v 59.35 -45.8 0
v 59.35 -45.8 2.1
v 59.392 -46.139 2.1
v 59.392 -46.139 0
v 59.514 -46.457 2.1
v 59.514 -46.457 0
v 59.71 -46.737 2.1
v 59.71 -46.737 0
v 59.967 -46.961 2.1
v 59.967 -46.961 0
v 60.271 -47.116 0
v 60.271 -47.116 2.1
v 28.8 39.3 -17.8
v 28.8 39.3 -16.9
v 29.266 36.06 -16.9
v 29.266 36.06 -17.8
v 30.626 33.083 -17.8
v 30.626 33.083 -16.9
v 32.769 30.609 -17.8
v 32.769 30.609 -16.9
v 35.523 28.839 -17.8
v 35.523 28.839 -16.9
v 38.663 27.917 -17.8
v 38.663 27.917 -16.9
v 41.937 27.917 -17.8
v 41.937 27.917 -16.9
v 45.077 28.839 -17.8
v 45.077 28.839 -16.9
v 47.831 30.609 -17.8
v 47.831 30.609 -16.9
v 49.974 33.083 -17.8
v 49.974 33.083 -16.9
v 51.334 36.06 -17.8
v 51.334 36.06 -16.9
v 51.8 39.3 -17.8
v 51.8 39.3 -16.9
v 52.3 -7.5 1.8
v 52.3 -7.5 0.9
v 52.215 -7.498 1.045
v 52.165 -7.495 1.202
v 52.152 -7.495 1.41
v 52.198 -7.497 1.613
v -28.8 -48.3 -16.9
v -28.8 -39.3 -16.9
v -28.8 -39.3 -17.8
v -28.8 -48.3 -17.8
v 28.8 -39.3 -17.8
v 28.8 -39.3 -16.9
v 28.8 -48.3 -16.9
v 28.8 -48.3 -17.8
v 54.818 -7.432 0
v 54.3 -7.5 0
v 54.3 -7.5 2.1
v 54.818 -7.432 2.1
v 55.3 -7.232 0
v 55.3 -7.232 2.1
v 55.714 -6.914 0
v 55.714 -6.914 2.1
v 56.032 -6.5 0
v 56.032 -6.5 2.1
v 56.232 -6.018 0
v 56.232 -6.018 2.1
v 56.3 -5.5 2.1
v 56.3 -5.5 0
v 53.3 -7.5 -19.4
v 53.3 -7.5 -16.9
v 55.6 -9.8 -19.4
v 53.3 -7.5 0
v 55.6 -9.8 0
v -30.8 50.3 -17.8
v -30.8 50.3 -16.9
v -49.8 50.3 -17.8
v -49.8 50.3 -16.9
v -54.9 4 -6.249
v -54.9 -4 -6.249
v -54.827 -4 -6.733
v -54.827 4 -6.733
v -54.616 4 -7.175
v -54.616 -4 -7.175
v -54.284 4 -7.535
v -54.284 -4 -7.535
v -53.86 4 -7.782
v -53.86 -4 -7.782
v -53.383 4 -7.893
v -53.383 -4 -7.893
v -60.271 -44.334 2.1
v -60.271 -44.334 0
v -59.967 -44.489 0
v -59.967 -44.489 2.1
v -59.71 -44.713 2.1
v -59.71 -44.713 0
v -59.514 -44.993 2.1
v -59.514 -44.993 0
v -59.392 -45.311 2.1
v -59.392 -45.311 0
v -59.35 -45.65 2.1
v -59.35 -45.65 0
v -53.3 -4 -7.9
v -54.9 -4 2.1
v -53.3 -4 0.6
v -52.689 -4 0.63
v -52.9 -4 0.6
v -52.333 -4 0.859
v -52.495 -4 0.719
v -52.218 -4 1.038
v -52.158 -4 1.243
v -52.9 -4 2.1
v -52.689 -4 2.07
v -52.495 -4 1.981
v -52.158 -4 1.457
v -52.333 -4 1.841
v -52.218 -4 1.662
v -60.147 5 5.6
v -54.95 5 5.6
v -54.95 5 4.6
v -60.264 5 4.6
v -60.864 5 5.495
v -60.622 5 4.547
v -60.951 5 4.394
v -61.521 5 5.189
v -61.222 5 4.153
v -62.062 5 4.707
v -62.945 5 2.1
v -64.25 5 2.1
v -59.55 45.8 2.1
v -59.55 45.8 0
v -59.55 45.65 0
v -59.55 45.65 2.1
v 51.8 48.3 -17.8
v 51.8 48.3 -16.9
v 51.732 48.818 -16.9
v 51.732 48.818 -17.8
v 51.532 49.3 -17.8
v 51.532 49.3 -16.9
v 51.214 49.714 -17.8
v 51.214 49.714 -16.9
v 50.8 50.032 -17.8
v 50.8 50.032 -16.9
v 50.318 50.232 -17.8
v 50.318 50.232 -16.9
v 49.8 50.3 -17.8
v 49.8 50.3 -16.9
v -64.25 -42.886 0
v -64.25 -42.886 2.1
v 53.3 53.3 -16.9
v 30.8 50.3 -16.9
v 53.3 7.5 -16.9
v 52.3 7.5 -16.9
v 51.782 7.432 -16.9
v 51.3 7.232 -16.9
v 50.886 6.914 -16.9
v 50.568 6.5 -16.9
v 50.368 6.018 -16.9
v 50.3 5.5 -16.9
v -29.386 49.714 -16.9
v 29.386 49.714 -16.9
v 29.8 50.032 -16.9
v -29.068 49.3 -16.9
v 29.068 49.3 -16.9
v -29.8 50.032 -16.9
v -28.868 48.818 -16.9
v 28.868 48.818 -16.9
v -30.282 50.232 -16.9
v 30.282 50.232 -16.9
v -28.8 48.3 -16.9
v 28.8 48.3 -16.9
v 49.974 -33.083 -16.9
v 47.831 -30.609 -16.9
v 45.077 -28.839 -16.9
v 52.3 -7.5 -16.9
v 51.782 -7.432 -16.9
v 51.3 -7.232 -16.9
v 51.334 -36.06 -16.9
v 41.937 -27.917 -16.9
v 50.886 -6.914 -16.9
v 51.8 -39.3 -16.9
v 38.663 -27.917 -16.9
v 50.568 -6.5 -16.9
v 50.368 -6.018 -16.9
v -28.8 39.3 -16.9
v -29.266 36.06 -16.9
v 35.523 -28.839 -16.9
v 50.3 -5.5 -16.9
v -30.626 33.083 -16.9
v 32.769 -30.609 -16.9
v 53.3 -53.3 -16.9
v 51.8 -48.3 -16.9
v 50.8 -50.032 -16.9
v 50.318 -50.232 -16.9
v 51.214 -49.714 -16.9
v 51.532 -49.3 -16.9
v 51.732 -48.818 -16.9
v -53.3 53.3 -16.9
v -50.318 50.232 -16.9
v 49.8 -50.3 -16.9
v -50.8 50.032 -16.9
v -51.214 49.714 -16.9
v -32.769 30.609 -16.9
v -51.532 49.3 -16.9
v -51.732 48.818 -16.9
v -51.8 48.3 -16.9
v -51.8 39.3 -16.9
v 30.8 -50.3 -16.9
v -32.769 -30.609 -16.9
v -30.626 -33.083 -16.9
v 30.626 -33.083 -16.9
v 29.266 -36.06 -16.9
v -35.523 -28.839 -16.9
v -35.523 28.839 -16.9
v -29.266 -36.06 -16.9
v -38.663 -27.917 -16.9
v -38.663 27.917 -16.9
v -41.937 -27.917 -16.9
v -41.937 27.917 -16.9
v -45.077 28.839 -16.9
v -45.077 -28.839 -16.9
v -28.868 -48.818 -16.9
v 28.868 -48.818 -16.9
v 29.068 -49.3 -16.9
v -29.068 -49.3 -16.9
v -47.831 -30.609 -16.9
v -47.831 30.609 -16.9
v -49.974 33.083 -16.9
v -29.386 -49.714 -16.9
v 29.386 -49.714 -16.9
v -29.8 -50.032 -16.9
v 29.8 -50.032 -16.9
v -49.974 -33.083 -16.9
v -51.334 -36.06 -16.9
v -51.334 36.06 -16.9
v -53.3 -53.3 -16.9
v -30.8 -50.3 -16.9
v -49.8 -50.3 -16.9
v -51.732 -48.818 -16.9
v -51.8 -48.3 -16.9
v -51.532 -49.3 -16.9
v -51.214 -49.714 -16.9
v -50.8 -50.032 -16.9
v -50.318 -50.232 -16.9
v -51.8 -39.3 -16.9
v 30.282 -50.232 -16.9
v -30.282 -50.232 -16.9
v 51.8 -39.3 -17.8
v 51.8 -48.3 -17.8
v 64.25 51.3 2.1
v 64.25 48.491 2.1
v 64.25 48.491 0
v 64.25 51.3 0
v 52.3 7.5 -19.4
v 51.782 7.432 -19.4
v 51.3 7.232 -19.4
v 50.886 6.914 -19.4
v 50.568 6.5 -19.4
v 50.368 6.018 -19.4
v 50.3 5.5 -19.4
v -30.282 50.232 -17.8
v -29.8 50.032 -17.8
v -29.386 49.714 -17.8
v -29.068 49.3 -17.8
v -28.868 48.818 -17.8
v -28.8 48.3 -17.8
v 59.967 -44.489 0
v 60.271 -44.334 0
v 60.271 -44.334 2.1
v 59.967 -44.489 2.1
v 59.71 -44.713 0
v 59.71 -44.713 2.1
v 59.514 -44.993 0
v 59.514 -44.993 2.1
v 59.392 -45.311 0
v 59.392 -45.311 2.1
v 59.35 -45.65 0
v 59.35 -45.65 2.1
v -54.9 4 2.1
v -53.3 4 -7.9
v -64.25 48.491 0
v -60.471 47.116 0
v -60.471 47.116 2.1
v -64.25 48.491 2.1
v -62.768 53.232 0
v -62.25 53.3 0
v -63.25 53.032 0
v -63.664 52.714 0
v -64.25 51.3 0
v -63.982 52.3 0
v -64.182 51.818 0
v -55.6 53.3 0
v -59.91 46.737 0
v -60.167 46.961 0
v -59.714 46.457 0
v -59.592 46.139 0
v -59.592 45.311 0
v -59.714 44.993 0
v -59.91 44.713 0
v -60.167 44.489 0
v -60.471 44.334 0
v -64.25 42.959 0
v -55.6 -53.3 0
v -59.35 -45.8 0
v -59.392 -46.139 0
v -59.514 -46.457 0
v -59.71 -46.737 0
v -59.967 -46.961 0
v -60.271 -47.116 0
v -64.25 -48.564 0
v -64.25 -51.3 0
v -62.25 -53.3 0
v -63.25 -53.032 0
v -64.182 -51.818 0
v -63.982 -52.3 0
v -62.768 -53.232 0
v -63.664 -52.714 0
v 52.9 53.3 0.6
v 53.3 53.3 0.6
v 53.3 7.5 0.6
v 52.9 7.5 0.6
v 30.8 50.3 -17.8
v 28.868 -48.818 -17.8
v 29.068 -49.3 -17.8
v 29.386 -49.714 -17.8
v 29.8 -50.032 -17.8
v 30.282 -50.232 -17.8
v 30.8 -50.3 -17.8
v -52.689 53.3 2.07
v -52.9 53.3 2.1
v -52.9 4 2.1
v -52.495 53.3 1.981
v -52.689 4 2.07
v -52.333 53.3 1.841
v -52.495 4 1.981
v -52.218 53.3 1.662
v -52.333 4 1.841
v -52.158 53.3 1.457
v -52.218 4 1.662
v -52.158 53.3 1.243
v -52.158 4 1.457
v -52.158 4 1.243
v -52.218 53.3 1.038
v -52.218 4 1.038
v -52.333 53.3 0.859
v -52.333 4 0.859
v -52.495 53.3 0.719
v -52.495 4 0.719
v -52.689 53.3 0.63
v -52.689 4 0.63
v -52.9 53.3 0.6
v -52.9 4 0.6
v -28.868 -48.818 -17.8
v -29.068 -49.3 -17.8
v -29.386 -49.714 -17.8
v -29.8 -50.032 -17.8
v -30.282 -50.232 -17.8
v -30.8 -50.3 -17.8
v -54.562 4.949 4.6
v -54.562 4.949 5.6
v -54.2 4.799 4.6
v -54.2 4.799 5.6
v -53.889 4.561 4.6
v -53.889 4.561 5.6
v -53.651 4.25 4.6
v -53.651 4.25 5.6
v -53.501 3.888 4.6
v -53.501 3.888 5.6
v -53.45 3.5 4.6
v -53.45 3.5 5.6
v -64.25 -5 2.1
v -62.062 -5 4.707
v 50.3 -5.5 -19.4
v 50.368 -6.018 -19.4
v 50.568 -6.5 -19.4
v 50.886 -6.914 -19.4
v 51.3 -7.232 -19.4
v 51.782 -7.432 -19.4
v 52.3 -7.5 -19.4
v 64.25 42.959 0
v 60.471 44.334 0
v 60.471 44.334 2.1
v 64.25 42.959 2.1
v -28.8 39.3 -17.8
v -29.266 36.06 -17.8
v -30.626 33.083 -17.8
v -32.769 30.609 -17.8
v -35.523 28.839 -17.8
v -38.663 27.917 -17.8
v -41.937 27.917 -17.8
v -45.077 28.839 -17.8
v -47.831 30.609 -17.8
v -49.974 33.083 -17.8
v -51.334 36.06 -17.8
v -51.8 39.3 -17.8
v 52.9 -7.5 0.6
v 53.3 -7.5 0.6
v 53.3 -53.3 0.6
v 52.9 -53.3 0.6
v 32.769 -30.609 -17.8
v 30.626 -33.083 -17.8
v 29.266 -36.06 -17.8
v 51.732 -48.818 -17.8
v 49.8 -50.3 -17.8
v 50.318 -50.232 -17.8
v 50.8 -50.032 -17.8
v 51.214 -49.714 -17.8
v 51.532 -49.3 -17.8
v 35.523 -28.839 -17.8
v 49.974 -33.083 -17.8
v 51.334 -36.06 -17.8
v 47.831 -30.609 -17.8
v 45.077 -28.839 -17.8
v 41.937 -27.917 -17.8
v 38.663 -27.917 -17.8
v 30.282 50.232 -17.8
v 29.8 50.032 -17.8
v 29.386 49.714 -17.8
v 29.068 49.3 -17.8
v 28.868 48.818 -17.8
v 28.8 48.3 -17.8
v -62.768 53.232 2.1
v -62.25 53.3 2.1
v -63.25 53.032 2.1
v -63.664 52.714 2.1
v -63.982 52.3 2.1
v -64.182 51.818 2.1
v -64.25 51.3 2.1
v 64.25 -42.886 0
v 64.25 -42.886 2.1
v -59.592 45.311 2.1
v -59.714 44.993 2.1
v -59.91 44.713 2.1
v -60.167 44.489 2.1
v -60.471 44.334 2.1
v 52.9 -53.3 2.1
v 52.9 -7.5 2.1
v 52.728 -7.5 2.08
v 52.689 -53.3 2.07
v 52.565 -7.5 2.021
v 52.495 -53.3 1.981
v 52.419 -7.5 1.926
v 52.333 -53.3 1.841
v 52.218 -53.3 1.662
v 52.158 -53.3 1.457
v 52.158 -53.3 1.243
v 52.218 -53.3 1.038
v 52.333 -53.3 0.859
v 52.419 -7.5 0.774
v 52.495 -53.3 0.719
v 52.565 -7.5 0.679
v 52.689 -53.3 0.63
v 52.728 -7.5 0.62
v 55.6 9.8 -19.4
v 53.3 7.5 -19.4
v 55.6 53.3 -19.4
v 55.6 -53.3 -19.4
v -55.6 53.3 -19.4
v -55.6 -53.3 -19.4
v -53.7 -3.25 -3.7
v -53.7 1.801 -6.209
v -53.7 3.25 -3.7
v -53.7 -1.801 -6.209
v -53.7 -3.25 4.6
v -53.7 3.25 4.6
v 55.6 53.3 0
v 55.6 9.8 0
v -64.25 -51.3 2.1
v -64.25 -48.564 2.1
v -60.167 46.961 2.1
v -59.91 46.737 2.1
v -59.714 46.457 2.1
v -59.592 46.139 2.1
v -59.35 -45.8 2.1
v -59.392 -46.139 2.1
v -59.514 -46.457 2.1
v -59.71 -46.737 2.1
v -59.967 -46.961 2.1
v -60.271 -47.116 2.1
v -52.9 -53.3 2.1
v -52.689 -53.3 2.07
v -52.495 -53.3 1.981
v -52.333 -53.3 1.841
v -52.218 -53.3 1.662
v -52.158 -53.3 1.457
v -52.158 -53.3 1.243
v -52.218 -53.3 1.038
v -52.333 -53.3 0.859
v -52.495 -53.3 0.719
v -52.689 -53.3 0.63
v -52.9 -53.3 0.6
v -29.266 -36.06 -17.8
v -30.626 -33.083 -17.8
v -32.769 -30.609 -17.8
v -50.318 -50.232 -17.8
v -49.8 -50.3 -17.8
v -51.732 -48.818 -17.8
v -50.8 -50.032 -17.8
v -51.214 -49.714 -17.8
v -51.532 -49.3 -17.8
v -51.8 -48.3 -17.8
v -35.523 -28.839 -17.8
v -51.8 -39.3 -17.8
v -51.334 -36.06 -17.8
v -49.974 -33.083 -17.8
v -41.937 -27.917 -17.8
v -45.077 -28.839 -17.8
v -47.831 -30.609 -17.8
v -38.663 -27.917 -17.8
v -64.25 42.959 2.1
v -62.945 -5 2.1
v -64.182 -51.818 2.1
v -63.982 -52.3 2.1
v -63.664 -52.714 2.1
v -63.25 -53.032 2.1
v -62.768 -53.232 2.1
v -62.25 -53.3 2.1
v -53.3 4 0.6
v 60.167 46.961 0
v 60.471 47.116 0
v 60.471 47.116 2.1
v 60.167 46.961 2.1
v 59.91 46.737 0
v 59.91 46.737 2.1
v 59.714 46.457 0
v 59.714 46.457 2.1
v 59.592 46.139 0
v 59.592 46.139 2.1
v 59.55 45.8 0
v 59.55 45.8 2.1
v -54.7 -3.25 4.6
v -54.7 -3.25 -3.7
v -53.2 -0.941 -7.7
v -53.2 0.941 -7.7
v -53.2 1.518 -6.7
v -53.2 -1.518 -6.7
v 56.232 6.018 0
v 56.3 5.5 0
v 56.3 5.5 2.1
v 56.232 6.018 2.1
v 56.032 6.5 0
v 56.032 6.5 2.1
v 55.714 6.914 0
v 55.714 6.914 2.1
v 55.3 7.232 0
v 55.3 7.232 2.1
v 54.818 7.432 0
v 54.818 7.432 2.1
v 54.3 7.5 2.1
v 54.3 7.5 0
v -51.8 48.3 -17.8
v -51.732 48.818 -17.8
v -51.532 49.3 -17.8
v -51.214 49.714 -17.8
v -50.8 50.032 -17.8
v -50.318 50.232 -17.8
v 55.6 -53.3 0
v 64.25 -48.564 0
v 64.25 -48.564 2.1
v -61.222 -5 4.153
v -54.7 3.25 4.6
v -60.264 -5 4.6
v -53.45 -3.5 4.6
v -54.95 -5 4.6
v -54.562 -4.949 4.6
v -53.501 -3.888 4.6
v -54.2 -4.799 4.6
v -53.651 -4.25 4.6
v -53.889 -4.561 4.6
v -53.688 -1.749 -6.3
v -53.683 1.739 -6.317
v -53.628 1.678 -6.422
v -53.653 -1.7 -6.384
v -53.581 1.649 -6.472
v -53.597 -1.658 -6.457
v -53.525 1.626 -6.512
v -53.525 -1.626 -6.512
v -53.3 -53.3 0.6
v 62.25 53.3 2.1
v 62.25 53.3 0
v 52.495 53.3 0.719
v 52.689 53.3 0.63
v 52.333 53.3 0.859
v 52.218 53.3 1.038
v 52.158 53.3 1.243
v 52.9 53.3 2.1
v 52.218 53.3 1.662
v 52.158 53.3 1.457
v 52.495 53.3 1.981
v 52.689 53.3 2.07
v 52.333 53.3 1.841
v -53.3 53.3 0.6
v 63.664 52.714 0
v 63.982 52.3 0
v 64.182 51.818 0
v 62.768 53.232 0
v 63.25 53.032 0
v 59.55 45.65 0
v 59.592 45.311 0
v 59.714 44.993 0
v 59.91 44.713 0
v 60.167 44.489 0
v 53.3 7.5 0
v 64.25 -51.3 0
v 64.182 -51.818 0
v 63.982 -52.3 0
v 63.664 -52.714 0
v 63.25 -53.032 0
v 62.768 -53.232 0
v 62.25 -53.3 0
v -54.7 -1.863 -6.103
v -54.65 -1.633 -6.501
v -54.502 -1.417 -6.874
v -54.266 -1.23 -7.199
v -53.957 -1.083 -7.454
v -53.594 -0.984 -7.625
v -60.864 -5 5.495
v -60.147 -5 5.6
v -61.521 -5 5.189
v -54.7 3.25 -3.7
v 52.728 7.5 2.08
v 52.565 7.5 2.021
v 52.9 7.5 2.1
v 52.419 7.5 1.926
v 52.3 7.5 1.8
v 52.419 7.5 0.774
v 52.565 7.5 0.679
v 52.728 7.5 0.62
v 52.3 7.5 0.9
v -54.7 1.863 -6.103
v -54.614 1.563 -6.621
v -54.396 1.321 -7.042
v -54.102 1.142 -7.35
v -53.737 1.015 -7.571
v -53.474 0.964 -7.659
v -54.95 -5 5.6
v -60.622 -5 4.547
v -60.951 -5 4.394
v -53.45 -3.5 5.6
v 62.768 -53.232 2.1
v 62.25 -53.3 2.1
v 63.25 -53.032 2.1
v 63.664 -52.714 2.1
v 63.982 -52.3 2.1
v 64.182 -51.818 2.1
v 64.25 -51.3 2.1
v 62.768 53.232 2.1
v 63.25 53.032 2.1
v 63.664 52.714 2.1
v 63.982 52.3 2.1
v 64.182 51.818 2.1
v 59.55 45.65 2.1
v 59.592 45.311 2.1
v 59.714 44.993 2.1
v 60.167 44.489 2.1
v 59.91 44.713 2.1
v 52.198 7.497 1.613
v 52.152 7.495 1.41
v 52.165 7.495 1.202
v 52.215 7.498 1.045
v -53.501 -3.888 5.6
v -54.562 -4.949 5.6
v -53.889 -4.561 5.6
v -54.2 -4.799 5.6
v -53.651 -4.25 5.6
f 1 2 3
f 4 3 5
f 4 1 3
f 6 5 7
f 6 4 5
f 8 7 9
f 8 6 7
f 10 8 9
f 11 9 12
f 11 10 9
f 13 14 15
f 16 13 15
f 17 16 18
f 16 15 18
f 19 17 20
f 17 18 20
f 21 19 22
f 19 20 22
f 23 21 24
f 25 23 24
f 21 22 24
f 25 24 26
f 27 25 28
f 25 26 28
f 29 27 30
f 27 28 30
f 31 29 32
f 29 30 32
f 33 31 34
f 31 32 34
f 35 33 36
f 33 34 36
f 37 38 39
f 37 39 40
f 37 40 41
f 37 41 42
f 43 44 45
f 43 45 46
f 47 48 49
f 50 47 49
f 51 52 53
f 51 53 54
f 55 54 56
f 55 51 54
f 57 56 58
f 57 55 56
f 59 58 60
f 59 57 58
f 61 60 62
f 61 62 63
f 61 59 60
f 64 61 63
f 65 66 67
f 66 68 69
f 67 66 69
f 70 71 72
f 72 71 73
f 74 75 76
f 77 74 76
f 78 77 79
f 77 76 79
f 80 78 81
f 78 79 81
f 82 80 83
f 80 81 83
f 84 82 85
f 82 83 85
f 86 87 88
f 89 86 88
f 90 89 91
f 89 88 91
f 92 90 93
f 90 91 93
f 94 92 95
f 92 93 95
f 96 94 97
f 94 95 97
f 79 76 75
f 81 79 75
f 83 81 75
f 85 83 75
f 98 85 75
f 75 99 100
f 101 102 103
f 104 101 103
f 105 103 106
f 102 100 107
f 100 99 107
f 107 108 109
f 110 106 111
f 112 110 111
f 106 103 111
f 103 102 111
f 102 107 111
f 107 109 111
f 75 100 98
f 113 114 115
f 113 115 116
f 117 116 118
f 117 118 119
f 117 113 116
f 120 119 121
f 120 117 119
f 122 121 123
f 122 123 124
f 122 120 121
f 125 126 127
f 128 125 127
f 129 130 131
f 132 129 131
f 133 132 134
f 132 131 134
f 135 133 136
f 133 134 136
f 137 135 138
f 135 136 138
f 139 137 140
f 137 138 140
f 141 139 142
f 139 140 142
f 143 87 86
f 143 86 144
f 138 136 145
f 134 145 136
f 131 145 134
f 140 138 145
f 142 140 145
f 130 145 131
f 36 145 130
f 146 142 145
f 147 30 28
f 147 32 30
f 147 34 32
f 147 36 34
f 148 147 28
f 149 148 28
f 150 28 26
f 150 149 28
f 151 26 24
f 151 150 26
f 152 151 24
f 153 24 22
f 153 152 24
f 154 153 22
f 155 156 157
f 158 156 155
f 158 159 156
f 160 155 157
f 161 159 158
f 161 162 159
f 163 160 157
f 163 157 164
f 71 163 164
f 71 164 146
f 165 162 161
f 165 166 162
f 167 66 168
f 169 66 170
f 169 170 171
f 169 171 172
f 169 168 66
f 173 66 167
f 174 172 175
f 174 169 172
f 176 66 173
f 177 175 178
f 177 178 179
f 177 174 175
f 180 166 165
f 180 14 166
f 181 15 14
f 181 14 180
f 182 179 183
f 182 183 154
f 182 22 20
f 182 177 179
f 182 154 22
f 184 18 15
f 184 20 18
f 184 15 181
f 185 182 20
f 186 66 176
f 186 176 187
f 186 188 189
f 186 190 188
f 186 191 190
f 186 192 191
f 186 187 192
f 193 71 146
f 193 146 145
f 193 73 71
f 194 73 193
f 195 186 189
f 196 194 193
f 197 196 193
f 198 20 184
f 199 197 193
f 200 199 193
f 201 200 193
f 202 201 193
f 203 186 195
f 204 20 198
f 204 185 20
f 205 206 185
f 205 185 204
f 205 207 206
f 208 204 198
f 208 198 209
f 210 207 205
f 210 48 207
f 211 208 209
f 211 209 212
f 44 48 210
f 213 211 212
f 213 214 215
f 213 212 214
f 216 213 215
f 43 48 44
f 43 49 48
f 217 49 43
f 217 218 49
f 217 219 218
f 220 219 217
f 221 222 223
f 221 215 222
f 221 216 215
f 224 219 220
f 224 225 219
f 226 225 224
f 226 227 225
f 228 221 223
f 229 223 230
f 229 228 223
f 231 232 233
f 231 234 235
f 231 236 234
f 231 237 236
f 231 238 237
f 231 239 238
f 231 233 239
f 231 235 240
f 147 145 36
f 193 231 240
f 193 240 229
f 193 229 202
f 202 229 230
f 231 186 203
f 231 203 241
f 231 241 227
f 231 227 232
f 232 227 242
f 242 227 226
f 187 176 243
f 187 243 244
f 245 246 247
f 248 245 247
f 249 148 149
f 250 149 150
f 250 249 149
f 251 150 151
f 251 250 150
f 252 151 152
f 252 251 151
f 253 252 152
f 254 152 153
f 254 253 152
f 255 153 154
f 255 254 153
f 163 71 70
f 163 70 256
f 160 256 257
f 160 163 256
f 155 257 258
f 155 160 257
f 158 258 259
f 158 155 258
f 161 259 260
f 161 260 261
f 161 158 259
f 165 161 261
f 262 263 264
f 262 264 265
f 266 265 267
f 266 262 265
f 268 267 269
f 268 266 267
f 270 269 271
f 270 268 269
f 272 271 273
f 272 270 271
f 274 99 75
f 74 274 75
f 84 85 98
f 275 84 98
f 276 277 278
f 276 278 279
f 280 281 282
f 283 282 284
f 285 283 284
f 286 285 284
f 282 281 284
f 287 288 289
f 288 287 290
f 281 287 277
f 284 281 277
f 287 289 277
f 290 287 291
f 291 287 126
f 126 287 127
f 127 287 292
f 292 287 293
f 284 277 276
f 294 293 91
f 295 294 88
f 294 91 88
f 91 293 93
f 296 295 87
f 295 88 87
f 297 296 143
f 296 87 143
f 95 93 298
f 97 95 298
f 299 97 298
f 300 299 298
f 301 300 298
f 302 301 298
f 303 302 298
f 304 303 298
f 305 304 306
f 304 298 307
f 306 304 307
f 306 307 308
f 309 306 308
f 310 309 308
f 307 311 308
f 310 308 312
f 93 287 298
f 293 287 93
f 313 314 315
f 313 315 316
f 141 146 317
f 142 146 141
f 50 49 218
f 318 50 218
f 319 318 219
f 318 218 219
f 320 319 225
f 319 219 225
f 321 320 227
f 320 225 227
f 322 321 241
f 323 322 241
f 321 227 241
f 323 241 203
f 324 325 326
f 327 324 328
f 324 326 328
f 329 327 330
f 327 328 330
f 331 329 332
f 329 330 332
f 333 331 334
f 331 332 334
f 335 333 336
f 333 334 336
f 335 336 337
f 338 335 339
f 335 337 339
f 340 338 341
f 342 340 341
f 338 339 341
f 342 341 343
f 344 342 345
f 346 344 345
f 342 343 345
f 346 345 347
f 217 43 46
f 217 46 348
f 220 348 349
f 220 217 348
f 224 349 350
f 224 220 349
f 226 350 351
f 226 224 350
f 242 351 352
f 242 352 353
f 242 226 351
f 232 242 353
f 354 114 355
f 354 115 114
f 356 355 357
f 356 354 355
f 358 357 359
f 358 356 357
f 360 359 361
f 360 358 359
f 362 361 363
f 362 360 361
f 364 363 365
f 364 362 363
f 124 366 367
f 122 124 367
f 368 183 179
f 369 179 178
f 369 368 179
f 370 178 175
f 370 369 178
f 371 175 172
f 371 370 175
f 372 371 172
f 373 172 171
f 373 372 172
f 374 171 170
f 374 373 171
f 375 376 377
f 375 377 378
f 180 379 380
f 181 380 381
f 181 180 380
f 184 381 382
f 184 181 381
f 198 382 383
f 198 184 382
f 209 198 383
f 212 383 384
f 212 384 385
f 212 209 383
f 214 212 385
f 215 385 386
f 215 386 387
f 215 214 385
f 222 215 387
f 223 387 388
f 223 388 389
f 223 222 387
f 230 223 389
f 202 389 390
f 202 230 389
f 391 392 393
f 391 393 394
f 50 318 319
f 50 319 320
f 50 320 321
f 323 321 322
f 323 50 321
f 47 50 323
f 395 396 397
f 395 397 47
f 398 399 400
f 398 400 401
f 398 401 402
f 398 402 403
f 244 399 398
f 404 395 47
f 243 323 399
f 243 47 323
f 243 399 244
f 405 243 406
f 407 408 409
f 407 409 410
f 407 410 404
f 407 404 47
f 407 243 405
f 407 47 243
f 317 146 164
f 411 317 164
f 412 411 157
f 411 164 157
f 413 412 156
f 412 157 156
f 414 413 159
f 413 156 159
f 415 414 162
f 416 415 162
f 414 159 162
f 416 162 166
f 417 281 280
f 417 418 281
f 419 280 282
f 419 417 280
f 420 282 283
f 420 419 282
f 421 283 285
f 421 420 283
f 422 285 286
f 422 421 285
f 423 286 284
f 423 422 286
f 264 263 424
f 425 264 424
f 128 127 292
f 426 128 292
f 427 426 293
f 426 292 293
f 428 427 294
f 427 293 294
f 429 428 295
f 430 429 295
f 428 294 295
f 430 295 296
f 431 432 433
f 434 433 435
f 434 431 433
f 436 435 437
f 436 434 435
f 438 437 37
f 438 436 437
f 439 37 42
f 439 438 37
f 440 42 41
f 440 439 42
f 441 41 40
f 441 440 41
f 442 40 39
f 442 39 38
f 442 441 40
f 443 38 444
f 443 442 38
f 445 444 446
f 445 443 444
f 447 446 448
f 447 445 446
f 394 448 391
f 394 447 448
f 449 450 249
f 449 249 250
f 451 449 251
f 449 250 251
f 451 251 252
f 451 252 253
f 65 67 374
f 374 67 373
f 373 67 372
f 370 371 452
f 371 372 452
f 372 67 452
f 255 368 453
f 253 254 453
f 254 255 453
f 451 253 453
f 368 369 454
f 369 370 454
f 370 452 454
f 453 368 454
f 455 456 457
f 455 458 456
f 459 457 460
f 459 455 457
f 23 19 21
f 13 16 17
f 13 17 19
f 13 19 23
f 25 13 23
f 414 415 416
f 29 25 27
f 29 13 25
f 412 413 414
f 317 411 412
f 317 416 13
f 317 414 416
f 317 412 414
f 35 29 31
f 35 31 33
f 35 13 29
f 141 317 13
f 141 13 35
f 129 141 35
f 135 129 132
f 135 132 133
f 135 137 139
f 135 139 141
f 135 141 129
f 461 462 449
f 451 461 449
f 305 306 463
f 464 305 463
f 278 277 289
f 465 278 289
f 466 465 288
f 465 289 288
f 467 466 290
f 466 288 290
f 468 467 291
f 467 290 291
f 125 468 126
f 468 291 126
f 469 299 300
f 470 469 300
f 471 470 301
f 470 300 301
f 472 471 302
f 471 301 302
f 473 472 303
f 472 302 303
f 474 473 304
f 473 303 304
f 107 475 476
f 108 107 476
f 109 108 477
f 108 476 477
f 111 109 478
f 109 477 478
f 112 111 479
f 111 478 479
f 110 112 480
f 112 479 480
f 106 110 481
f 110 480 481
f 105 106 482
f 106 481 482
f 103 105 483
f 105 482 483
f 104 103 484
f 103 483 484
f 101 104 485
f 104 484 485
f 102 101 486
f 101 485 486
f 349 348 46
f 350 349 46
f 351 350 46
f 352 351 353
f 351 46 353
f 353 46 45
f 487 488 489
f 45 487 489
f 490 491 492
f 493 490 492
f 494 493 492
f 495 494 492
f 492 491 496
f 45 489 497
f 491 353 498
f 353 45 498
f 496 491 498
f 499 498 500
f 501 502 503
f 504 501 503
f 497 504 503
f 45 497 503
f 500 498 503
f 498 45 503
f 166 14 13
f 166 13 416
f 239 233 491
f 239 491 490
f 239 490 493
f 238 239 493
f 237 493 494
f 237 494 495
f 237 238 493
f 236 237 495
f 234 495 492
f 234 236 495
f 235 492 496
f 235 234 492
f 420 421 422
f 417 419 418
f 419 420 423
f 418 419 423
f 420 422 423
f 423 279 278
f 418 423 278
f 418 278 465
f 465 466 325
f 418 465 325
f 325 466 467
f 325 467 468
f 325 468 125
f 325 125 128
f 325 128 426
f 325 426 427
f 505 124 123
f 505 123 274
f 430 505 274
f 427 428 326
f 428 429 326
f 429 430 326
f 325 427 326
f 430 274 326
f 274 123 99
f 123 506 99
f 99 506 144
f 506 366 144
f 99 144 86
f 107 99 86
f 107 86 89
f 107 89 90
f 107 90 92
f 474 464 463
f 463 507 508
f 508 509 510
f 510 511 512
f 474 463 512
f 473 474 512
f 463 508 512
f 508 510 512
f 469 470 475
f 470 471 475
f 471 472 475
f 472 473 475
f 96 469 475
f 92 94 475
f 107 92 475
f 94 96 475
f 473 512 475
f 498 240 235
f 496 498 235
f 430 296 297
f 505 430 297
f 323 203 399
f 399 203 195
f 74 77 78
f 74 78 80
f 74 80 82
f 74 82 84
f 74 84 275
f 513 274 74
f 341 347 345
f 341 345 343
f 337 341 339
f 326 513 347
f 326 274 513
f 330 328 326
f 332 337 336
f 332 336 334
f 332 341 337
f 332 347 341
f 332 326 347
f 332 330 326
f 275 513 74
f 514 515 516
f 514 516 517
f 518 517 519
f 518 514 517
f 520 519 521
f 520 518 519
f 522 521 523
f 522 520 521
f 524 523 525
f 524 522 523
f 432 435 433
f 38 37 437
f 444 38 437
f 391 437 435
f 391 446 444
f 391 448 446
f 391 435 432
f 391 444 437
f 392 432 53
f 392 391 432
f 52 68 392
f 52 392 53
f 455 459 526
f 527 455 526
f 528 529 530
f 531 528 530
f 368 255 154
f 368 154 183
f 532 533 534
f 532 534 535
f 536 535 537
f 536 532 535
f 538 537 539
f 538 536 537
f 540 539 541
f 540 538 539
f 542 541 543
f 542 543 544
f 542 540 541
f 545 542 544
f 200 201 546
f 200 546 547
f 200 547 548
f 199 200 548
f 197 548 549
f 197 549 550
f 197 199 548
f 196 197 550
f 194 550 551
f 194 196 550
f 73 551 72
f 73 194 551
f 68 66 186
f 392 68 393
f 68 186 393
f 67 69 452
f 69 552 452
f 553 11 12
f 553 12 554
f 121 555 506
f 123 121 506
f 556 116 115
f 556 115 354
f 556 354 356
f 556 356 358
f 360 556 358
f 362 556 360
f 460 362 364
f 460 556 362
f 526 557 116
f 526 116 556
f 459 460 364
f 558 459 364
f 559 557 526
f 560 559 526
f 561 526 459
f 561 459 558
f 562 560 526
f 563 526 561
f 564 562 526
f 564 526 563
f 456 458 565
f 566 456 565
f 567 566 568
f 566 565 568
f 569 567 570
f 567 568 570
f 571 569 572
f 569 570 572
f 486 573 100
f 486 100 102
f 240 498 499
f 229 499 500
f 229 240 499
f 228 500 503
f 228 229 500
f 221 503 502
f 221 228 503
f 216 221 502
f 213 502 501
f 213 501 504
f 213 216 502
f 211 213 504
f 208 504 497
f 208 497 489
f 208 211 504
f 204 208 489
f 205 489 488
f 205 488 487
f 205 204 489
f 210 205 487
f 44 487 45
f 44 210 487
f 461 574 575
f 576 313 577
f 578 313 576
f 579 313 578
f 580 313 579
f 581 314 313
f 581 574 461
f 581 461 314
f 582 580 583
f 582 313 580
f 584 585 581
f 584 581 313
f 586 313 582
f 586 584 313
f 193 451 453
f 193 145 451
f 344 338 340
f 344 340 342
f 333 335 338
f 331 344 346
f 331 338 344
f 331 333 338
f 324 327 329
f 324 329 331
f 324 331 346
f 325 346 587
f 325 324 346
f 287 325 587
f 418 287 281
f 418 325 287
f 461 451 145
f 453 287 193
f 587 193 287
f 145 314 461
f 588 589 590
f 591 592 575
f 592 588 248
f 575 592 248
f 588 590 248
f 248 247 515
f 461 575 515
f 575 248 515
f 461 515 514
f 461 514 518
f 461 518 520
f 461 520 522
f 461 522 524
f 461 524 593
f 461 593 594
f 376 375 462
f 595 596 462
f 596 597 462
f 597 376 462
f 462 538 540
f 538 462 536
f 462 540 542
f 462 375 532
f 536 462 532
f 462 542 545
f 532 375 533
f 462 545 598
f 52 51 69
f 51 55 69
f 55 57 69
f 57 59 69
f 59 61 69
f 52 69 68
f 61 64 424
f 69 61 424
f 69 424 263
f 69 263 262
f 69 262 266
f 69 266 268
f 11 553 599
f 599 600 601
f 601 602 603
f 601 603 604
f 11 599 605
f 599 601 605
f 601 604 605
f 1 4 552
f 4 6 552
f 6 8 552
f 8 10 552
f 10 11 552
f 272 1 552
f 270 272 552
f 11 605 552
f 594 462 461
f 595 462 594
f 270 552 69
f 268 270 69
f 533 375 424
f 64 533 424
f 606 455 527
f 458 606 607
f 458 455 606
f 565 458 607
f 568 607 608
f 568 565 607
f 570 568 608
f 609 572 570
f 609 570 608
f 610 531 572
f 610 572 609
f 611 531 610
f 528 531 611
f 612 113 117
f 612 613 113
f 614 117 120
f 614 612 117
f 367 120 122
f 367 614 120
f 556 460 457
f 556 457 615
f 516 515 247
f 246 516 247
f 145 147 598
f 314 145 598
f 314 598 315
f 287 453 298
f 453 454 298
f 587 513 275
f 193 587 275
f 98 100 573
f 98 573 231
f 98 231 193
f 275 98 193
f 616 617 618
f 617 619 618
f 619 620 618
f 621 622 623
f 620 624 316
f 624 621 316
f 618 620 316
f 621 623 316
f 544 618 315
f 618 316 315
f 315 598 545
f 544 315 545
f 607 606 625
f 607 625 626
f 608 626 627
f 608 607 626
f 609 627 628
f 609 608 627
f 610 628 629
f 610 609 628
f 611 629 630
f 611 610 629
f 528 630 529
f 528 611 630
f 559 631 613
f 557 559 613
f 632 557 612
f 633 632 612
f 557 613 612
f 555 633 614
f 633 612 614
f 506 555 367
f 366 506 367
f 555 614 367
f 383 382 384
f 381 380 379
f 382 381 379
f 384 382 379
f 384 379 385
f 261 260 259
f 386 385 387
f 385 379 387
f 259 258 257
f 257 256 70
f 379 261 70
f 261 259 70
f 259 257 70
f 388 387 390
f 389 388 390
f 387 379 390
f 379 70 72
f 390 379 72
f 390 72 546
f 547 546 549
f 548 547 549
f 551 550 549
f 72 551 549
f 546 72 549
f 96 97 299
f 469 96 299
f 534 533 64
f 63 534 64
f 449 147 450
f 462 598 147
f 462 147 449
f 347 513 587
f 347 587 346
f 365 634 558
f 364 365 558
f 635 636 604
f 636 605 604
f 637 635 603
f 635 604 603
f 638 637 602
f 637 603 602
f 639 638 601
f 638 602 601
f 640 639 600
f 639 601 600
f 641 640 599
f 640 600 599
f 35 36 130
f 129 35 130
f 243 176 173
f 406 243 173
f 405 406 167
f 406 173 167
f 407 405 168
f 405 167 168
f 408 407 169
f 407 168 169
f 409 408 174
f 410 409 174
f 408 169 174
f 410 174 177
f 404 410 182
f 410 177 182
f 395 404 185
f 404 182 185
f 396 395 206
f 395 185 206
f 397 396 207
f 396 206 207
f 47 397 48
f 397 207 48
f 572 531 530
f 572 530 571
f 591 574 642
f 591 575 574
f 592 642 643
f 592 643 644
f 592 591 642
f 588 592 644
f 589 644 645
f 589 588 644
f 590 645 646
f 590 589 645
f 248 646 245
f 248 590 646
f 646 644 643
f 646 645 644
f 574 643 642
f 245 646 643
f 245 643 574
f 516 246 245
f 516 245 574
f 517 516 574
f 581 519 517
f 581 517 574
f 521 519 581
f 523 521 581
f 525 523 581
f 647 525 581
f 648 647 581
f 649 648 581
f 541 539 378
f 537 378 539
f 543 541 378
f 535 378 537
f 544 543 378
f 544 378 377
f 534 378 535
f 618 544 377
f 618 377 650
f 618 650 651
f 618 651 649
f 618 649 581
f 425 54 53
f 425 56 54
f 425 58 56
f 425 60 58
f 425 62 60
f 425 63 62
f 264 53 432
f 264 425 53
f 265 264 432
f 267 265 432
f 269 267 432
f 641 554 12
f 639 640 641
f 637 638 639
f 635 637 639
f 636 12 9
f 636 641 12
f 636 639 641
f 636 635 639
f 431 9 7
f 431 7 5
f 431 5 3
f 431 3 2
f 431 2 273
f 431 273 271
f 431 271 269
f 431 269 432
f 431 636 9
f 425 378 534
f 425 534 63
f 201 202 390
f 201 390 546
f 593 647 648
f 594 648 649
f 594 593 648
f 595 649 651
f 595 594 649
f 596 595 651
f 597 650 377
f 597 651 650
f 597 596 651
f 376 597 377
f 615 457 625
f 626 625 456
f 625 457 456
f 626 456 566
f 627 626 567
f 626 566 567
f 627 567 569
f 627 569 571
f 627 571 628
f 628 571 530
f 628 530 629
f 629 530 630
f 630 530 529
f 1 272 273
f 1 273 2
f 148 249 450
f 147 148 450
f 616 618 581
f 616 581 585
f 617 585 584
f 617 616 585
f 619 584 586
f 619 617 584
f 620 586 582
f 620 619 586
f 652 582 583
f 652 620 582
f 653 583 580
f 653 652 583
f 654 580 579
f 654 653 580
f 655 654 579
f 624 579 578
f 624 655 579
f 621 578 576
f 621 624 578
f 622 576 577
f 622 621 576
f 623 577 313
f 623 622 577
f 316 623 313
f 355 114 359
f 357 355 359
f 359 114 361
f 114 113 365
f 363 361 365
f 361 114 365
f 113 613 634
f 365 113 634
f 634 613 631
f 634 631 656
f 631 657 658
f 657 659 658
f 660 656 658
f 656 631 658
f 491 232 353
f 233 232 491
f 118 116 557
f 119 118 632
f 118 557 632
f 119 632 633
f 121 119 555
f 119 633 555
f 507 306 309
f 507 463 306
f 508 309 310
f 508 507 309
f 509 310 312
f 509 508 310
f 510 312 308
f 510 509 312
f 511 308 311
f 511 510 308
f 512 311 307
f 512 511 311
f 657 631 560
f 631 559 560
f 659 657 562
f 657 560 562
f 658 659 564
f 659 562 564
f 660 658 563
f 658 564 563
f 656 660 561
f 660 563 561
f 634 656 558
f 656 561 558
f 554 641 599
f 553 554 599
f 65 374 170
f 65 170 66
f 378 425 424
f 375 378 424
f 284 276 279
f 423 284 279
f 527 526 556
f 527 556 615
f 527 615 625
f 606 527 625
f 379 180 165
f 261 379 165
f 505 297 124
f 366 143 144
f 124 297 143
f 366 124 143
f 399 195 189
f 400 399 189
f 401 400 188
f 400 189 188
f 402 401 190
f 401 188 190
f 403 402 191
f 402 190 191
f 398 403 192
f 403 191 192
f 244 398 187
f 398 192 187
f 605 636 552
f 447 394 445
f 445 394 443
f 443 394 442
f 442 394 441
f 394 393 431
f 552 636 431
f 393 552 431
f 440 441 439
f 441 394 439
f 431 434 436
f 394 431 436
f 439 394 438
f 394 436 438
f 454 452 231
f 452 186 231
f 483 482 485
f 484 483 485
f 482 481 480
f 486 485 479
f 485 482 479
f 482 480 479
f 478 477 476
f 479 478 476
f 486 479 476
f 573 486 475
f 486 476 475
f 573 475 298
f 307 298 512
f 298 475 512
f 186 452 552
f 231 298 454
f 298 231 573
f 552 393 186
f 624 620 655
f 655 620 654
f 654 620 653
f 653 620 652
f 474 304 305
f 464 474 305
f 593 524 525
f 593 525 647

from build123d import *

# Parameters (mm, degrees)
PAD003_DEPTH    = 5
PAD_DEPTH       = 3.25
POCKET012_DEPTH = 54.7
FILLET_R        = 1.5
PAD004_DEPTH    = 19.4
PAD005_DEPTH    = 2.1
PAD001_DEPTH    = 53.3
PAD002_DEPTH    = 53.3
POCKET_DEPTH    = 17.8
POCKET001_DEPTH = 5
POCKET011_DEPTH = 4
FILLET001_R     = 2


with BuildPart() as body:
    # Sketch025 → Pad003 (new body, symmetric)
    with BuildSketch(Plane.XZ):
        with BuildLine():
            Line((-64.25, 2.1), (-62.062493, 4.706969))
            ThreePointArc((-60.147382, 5.6), (-61.203928, 5.365769), (-62.062493, 4.706969))
            Line((-60.147382, 5.6), (-53.45, 5.6))
            Line((-53.45, 5.6), (-53.45, 4.6))
            Line((-53.45, 4.6), (-53.7, 4.6))
            Line((-54.7, 4.6), (-53.7, 4.6))
            Line((-54.7, 4.6), (-60.263959, 4.6))
            ThreePointArc((-60.263959, 4.6), (-60.792232, 4.482885), (-61.221515, 4.153485))
            Line((-61.221515, 4.153485), (-62.944593, 2.1))
            Line((-64.25, 2.1), (-62.944593, 2.1))
        make_face()
    extrude(amount=PAD003_DEPTH, both=True)

    # Sketch028 → Pad (join, symmetric)
    with BuildSketch(Plane.XZ):
        with BuildLine():
            Line((-53.7, 3.1), (-53.7, -6.209252))
            ThreePointArc((-53.7, -6.209252), (-53.653109, -6.384252), (-53.525, -6.512361))
            Line((-53.2, -6.7), (-53.525, -6.512361))
            Line((-53.2, -7.7), (-53.2, -6.7))
            ThreePointArc((-54.7, -6.103128), (-54.26619, -7.198573), (-53.2, -7.7))
            Line((-54.7, 3.1), (-54.7, -6.103128))
            Line((-54.7, 3.1), (-54.7, 4.6))
            Line((-54.7, 4.6), (-53.7, 4.6))
            Line((-53.7, 3.1), (-53.7, 4.6))
        make_face()
    extrude(amount=PAD_DEPTH, both=True)

    # Sketch027 → Pocket012 (cut)
    with BuildSketch(Plane.YZ):
        Polygon((3.25, -3.7), (0.940599, -7.7), (3.25, -7.7), align=None)
    pocket012 = extrude(amount=-POCKET012_DEPTH, mode=Mode.SUBTRACT)

    # Mirrored001: Pocket012 across Sketch027 V_Axis
    add(pocket012.mirror(Plane(origin=(0, 0, 0), x_dir=(1, 0, 0), z_dir=(0, 1, 0))), mode=Mode.SUBTRACT)

    # Fillet
    fillet_edges = [body.edges().sort_by_distance(p)[0] for p in [
        (-53.45, -5, 5.1),
        (-53.45, 5, 5.1),
    ]]
    fillet(fillet_edges, radius=FILLET_R)


with BuildPart() as body002:
    # Sketch011 → Pad004 (new body)
    with BuildSketch(Plane.XY):
        with BuildLine():
            Line((50.3, 5.5), (50.3, -5.5))
            ThreePointArc((50.3, -5.5), (50.885786, -6.914214), (52.3, -7.5))
            Line((53.3, -7.5), (52.3, -7.5))
            Line((53.3, -7.5), (55.6, -9.8))
            Line((55.6, 9.8), (55.6, -9.8))
            Line((53.3, 7.5), (55.6, 9.8))
            Line((52.3, 7.5), (53.3, 7.5))
            ThreePointArc((52.3, 7.5), (50.885786, 6.914214), (50.3, 5.5))
        make_face()
    extrude(amount=-PAD004_DEPTH)

    # Sketch029 → Pad005 (join)
    with BuildSketch(Plane.XY):
        with BuildLine():
            Line((50.3, 5.5), (50.3, -5.5))
            ThreePointArc((50.3, -5.5), (50.885786, -6.914214), (52.3, -7.5))
            Line((53.3, -7.5), (52.3, -7.5))
            Line((53.3, -7.5), (54.3, -7.5))
            ThreePointArc((54.3, -7.5), (55.714214, -6.914214), (56.3, -5.5))
            Line((56.3, 5.5), (56.3, -5.5))
            ThreePointArc((56.3, 5.5), (55.714214, 6.914214), (54.3, 7.5))
            Line((53.3, 7.5), (54.3, 7.5))
            Line((52.3, 7.5), (53.3, 7.5))
            ThreePointArc((52.3, 7.5), (50.885786, 6.914214), (50.3, 5.5))
        make_face()
    extrude(amount=PAD005_DEPTH)


with BuildPart() as eurorack_case:
    # Sketch001 → Pad001 (new body, symmetric)
    with BuildSketch(Plane.XZ):
        Polygon((64.25, 0), (55.6, 0), (55.6, -19.4), (-55.6, -19.4), (-55.6, 0), (-64.25, 0), (-64.25, 2.1), (-53.3, 2.1), (-53.3, -16.9), (0, -16.9), (53.3, -16.9), (53.3, 2.1), (64.25, 2.1), align=None)
    extrude(amount=PAD001_DEPTH, both=True)

    # Sketch002 → Pad002 (join, symmetric)
    with BuildSketch(Plane.XZ):
        with BuildLine():
            ThreePointArc((52.9, 2.1), (52.15, 1.35), (52.9, 0.6))
            Line((53.3, 0.6), (52.9, 0.6))
            Line((53.3, 2.1), (53.3, 0.6))
            Line((53.3, 2.1), (52.9, 2.1))
        make_face()
    pad002 = extrude(amount=PAD002_DEPTH, both=True)

    # Sketch003 → Pocket (cut)
    with BuildSketch(Plane.XY):
        with BuildLine():
            ThreePointArc((28.8, 39.3), (40.3, 27.8), (51.8, 39.3))
            Line((51.8, 39.3), (51.8, 48.3))
            ThreePointArc((51.8, 48.3), (51.214214, 49.714214), (49.8, 50.3))
            Line((30.8, 50.3), (49.8, 50.3))
            ThreePointArc((30.8, 50.3), (29.385786, 49.714214), (28.8, 48.3))
            Line((28.8, 39.3), (28.8, 48.3))
        make_face()
        with BuildLine():
            ThreePointArc((51.8, -39.3), (40.3, -27.8), (28.8, -39.3))
            Line((28.8, -39.3), (28.8, -48.3))
            ThreePointArc((28.8, -48.3), (29.385786, -49.714214), (30.8, -50.3))
            Line((30.8, -50.3), (49.8, -50.3))
            ThreePointArc((49.8, -50.3), (51.214214, -49.714214), (51.8, -48.3))
            Line((51.8, -39.3), (51.8, -48.3))
        make_face()
    pocket = extrude(amount=-POCKET_DEPTH, mode=Mode.SUBTRACT)

    # Sketch004 → Pocket001 (cut)
    with BuildSketch(Plane.XY):
        with BuildLine():
            ThreePointArc((59.35, -45.8), (59.603187, -46.603007), (60.271172, -47.11557))
            Line((60.271172, -47.11557), (64.25, -48.563745))
            Line((64.25, -42.886255), (64.25, -48.563745))
            Line((60.271172, -44.33443), (64.25, -42.886255))
            ThreePointArc((60.271172, -44.33443), (59.603187, -44.846993), (59.35, -45.65))
            Line((59.35, -45.65), (59.35, -45.8))
        make_face()
        with BuildLine():
            ThreePointArc((60.471172, 47.11557), (59.803187, 46.603007), (59.55, 45.8))
            Line((59.55, 45.8), (59.55, 45.65))
            ThreePointArc((59.55, 45.65), (59.803187, 44.846993), (60.471172, 44.33443))
            Line((60.471172, 44.33443), (64.25, 42.959049))
            Line((64.25, 48.490951), (64.25, 42.959049))
            Line((60.471172, 47.11557), (64.25, 48.490951))
        make_face()
    pocket001 = extrude(amount=POCKET001_DEPTH, mode=Mode.SUBTRACT)

    # Mirrored: Pad002, Pocket, Pocket001 across Sketch002 V_Axis
    add(pad002.mirror(Plane(origin=(0, 0, 0), x_dir=(0, -1, 0), z_dir=(1, 0, 0))))
    add(pocket.mirror(Plane(origin=(0, 0, 0), x_dir=(0, -1, 0), z_dir=(1, 0, 0))), mode=Mode.SUBTRACT)
    add(pocket001.mirror(Plane(origin=(0, 0, 0), x_dir=(0, -1, 0), z_dir=(1, 0, 0))), mode=Mode.SUBTRACT)

    # Sketch024 → Pocket011 (cut, symmetric)
    with BuildSketch(Plane.XZ):
        with BuildLine():
            Line((-54.9, 3), (-54.9, -6.248633))
            ThreePointArc((-54.9, -6.248633), (-54.463, -7.367173), (-53.383476, -7.893225))
            Line((-53.383476, -7.893225), (-53.3, -7.9))
            Line((-51.9, 3), (-53.3, -7.9))
            Line((-54.9, 3), (-51.9, 3))
        make_face()
    extrude(amount=POCKET011_DEPTH, both=True, mode=Mode.SUBTRACT)

    # Boolean: union Body
    add(body.part)

    # Boolean001: cut Body002
    add(body002.part, mode=Mode.SUBTRACT)

    # Fillet001
    fillet001_edges = [eurorack_case.edges().sort_by_distance(p)[0] for p in [
        (64.25, -53.3, 1.05),
        (64.25, 53.3, 1.05),
        (-64.25, -53.3, 1.05),
        (-64.25, 53.3, 1.05),
    ]]
    fillet(fillet001_edges, radius=FILLET001_R)


solid = eurorack_case.part
